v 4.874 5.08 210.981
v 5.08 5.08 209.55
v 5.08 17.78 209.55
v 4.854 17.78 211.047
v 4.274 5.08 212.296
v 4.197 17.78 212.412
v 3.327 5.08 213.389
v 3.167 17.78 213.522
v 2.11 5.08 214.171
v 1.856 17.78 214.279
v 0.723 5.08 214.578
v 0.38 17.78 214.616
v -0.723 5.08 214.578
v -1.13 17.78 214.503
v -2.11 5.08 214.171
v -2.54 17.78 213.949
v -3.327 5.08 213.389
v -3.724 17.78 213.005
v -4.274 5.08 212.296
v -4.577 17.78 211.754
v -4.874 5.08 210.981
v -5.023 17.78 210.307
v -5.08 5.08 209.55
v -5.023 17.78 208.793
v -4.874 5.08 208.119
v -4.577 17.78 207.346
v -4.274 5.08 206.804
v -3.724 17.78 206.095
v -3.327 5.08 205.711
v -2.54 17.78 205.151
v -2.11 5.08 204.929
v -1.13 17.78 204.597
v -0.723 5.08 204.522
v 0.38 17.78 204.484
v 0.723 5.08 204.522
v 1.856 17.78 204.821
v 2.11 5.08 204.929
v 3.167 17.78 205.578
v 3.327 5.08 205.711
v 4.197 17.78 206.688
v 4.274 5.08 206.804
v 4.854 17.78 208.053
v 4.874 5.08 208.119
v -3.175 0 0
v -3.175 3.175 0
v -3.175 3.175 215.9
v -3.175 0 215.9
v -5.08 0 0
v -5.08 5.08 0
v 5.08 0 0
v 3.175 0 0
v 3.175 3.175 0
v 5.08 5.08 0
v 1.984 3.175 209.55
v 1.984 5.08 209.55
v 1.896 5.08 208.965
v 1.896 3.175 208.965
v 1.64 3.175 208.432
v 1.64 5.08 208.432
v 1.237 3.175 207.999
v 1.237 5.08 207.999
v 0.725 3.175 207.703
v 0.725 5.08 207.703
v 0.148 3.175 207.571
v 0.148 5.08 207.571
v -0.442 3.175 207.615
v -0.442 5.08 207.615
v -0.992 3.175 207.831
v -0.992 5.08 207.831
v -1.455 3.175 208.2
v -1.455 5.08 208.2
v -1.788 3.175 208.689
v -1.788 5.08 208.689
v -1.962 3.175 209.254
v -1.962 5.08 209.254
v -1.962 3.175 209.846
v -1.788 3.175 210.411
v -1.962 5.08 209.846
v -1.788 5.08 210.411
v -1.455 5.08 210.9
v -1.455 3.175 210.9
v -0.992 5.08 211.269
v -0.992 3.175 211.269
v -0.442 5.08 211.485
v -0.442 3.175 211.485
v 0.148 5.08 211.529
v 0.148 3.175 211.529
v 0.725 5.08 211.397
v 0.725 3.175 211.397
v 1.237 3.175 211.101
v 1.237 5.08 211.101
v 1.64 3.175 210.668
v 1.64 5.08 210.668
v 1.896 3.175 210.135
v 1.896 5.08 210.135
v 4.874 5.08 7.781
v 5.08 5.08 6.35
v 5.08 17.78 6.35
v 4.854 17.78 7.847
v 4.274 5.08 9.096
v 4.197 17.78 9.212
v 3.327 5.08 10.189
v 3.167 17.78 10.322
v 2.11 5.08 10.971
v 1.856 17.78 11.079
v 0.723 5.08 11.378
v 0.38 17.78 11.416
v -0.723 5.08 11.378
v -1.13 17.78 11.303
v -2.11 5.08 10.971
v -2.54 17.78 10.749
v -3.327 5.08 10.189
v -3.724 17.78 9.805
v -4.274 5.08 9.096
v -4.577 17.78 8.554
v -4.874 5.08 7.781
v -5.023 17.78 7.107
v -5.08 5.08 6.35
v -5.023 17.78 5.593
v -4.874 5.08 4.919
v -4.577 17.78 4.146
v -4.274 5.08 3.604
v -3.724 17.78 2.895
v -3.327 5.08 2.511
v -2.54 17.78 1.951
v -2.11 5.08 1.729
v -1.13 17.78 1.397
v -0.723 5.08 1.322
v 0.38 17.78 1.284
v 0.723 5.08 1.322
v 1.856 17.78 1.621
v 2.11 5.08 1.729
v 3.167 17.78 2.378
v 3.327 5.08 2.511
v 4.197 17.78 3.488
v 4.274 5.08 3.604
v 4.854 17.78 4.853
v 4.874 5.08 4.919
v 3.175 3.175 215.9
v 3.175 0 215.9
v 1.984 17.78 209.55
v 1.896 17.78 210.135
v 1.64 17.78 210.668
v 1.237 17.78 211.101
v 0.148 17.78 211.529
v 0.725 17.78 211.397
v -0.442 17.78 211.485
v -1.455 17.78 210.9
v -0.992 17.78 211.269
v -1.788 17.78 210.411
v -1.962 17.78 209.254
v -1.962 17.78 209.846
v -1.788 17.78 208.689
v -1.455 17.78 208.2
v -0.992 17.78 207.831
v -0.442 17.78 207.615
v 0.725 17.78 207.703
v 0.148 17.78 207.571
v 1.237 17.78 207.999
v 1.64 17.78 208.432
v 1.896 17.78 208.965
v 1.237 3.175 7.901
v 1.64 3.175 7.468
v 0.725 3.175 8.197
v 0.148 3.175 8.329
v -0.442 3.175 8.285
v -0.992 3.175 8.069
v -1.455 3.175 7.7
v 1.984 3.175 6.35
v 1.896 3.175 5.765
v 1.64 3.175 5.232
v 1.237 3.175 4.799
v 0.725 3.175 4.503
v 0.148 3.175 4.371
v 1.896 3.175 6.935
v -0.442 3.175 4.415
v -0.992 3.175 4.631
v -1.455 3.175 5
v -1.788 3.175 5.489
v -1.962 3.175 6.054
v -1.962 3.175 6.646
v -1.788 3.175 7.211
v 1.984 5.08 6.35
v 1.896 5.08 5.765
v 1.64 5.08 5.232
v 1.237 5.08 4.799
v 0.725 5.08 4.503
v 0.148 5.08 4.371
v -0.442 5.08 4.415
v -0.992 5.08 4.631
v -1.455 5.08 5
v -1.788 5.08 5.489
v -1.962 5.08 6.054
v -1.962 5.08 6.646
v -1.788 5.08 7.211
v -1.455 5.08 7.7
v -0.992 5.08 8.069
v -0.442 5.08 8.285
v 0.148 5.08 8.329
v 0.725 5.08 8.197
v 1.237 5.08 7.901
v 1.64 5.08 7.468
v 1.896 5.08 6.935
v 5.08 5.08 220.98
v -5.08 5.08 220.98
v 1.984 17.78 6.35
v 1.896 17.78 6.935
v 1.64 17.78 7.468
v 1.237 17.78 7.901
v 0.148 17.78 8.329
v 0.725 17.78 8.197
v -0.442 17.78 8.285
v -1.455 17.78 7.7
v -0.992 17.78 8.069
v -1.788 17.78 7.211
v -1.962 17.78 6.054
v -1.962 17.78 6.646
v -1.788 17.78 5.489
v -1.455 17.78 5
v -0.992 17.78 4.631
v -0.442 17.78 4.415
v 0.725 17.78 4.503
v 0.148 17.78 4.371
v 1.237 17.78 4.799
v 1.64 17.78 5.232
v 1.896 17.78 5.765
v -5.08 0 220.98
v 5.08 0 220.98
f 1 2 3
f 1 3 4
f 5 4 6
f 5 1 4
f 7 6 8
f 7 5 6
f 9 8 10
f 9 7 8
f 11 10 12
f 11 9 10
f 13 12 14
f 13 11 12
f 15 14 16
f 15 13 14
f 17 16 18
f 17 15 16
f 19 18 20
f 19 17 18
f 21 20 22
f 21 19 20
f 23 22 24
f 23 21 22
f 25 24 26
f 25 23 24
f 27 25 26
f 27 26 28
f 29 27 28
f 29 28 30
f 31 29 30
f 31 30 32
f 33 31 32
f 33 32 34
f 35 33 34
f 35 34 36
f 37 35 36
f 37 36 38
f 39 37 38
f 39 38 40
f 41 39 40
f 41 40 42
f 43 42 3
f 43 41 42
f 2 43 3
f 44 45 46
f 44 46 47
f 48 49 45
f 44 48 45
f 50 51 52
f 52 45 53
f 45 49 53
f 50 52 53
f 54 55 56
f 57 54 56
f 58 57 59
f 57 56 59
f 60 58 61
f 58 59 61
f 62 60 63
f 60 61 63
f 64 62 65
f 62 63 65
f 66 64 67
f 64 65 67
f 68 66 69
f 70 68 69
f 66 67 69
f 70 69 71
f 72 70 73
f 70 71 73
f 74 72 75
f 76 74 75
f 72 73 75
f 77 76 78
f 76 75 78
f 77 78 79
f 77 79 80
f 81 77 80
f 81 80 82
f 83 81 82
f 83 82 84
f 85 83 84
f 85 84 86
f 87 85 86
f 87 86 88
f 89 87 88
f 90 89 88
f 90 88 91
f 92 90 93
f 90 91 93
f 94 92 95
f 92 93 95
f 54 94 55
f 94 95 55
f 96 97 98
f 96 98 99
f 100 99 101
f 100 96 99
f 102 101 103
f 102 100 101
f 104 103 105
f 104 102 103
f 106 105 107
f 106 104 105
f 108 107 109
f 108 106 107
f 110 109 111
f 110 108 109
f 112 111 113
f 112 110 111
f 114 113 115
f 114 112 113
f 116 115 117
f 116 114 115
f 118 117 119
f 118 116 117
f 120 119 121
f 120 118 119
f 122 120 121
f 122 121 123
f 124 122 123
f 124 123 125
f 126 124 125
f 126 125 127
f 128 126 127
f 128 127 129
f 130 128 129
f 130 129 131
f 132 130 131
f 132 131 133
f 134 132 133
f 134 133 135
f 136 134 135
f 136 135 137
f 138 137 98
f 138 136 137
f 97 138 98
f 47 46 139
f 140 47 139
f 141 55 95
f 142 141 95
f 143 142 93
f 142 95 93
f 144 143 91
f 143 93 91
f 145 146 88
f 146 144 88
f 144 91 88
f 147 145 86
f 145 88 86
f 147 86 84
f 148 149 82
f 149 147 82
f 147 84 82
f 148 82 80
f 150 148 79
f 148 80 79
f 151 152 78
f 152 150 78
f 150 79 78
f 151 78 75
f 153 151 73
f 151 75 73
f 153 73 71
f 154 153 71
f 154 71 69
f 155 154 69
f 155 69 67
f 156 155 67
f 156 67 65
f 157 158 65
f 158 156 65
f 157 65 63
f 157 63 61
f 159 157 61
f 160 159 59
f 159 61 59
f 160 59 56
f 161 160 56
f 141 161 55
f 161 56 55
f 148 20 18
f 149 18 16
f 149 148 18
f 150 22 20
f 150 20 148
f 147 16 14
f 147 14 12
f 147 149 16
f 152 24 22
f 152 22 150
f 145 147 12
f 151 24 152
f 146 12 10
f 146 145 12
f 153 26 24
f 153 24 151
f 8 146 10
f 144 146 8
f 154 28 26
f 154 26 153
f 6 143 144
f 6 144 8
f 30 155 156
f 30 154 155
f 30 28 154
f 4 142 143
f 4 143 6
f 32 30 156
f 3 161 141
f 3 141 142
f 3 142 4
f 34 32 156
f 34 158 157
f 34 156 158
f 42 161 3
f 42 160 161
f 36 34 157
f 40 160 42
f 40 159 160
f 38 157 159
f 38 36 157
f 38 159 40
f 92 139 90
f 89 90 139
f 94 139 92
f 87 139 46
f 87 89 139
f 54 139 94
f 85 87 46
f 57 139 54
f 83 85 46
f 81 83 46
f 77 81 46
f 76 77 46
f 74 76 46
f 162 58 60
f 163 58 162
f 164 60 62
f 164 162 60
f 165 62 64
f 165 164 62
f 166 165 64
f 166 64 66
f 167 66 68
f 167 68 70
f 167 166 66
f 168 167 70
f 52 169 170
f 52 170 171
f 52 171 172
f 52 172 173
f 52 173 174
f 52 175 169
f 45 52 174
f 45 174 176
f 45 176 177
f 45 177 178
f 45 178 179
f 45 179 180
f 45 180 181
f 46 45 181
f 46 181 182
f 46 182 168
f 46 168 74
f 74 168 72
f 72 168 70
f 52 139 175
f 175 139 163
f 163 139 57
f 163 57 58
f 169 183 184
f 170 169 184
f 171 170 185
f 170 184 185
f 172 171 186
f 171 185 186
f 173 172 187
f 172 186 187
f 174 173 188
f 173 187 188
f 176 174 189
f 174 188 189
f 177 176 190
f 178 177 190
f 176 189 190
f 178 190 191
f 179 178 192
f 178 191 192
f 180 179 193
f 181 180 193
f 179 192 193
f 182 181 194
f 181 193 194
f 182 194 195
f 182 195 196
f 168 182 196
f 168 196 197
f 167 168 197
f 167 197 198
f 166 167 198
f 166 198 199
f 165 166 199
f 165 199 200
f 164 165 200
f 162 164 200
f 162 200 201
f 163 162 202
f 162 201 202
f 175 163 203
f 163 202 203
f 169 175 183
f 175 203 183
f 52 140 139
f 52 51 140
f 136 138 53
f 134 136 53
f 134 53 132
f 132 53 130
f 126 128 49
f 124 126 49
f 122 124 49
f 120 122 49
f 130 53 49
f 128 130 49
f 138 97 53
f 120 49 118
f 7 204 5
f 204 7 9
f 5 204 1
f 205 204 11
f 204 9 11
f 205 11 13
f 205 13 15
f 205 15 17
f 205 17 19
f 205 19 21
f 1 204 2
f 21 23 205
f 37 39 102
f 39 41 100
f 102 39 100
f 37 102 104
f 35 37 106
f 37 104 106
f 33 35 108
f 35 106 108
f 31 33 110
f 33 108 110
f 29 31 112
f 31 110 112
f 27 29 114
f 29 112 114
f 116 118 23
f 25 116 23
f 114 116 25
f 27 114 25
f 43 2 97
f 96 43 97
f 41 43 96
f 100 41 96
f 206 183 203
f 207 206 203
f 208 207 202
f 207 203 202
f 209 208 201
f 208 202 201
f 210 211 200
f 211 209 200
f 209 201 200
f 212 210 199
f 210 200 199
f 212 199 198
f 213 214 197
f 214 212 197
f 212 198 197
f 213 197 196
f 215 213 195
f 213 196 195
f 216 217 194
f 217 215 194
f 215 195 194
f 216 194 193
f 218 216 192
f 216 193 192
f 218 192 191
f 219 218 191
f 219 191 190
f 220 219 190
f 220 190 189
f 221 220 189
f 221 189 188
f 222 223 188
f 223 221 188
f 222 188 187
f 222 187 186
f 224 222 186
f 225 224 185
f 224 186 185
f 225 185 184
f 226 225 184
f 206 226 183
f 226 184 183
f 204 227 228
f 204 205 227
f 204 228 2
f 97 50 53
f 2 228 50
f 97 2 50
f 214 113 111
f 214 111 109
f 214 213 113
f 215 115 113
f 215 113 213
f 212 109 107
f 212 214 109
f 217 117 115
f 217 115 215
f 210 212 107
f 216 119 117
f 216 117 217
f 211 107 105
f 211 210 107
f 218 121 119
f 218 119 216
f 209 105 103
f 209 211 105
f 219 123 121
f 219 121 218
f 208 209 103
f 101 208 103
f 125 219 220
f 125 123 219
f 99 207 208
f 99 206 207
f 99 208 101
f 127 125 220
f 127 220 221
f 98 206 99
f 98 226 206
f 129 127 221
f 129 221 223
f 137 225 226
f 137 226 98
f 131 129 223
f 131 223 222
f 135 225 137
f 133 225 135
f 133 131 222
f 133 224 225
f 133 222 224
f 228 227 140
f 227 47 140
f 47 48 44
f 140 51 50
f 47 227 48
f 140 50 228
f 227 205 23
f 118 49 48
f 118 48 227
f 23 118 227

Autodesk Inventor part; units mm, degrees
ref_plane "YZ Plane" through (0, 0, 0) normal (1, 0, 0) x (0, 1, 0)
ref_plane "XZ Plane" through (0, 0, 0) normal (0, 1, 0) x (-1, 0, 0)
ref_plane "XY Plane" through (0, 0, 0) normal (0, 0, 1) x (1, 0, 0)
sketch "Sketch1" plane through (0, 0, 0) normal (0, 0, 1) x (1, 0, 0)
  line L0 (3.175, 0) -> (3.175, 3.175)
  line L1 (3.175, 3.175) -> (-3.175, 3.175)
  line L2 (-3.175, 3.175) -> (-3.175, 0)
  line L3 (5.08, 0) -> (5.08, 5.08)
  line L4 (5.08, 5.08) -> (-5.08, 5.08)
  line L5 (-5.08, 5.08) -> (-5.08, 0)
  line L6 (-5.08, 0) -> (-3.175, 0)
  line L7 (3.175, 0) -> (5.08, 0)
  point P0 (0, 0)
  dimension "d0" = 10.16
  dimension "d1" = 5.08
extrude "Extrusion1" add sketch "Sketch1" along normal blind 215.9
sketch "Sketch2" plane through (-5.08, 5.08, 0) normal (0, 1, 0) x (1, 0, 0)
  circle A0 centre (5.08, -6.35) radius 1.9844
  circle A1 centre (5.08, -209.55) radius 1.9844
  point P0 (5.08, 0)
  dimension "d4" = 3.9688
  dimension "d5" = 3.9688
extrude "Extrusion2" cut sketch "Sketch2" against normal blind 215.9
sketch "Sketch3" plane through (-5.08, 5.08, 0) normal (0, 1, 0) x (1, 0, 0)
  circle A0 centre (5.08, -6.35) radius 1.9844 projected
  circle A1 centre (5.08, -209.55) radius 1.9844 projected
  circle A2 centre (5.08, -209.55) radius 5.08
  line L0 (10.16, 0) -> (10.16, -215.9) projected
  circle A3 centre (5.08, -6.35) radius 5.08
  point P0 (5.08, 0)
extrude "Extrusion3" add sketch "Sketch3" along normal blind 12.7
sketch "Sketch4" plane through (0, 0, 215.9) normal (0, 0, 1) x (1, 0, 0)
  line L0 (-5.08, 5.08) -> (-5.08, 0) projected
  line L1 (-5.08, 0) -> (5.08, 0)
  line L2 (5.08, 0) -> (5.08, 5.08)
  line L3 (5.08, 5.08) -> (-5.08, 5.08)
  line L4 (-5.08, 5.08) -> (-5.08, 0)
  point P0 (0, 0)
extrude "Extrusion4" add sketch "Sketch4" along normal blind 5.08
properties part number "bumper"
